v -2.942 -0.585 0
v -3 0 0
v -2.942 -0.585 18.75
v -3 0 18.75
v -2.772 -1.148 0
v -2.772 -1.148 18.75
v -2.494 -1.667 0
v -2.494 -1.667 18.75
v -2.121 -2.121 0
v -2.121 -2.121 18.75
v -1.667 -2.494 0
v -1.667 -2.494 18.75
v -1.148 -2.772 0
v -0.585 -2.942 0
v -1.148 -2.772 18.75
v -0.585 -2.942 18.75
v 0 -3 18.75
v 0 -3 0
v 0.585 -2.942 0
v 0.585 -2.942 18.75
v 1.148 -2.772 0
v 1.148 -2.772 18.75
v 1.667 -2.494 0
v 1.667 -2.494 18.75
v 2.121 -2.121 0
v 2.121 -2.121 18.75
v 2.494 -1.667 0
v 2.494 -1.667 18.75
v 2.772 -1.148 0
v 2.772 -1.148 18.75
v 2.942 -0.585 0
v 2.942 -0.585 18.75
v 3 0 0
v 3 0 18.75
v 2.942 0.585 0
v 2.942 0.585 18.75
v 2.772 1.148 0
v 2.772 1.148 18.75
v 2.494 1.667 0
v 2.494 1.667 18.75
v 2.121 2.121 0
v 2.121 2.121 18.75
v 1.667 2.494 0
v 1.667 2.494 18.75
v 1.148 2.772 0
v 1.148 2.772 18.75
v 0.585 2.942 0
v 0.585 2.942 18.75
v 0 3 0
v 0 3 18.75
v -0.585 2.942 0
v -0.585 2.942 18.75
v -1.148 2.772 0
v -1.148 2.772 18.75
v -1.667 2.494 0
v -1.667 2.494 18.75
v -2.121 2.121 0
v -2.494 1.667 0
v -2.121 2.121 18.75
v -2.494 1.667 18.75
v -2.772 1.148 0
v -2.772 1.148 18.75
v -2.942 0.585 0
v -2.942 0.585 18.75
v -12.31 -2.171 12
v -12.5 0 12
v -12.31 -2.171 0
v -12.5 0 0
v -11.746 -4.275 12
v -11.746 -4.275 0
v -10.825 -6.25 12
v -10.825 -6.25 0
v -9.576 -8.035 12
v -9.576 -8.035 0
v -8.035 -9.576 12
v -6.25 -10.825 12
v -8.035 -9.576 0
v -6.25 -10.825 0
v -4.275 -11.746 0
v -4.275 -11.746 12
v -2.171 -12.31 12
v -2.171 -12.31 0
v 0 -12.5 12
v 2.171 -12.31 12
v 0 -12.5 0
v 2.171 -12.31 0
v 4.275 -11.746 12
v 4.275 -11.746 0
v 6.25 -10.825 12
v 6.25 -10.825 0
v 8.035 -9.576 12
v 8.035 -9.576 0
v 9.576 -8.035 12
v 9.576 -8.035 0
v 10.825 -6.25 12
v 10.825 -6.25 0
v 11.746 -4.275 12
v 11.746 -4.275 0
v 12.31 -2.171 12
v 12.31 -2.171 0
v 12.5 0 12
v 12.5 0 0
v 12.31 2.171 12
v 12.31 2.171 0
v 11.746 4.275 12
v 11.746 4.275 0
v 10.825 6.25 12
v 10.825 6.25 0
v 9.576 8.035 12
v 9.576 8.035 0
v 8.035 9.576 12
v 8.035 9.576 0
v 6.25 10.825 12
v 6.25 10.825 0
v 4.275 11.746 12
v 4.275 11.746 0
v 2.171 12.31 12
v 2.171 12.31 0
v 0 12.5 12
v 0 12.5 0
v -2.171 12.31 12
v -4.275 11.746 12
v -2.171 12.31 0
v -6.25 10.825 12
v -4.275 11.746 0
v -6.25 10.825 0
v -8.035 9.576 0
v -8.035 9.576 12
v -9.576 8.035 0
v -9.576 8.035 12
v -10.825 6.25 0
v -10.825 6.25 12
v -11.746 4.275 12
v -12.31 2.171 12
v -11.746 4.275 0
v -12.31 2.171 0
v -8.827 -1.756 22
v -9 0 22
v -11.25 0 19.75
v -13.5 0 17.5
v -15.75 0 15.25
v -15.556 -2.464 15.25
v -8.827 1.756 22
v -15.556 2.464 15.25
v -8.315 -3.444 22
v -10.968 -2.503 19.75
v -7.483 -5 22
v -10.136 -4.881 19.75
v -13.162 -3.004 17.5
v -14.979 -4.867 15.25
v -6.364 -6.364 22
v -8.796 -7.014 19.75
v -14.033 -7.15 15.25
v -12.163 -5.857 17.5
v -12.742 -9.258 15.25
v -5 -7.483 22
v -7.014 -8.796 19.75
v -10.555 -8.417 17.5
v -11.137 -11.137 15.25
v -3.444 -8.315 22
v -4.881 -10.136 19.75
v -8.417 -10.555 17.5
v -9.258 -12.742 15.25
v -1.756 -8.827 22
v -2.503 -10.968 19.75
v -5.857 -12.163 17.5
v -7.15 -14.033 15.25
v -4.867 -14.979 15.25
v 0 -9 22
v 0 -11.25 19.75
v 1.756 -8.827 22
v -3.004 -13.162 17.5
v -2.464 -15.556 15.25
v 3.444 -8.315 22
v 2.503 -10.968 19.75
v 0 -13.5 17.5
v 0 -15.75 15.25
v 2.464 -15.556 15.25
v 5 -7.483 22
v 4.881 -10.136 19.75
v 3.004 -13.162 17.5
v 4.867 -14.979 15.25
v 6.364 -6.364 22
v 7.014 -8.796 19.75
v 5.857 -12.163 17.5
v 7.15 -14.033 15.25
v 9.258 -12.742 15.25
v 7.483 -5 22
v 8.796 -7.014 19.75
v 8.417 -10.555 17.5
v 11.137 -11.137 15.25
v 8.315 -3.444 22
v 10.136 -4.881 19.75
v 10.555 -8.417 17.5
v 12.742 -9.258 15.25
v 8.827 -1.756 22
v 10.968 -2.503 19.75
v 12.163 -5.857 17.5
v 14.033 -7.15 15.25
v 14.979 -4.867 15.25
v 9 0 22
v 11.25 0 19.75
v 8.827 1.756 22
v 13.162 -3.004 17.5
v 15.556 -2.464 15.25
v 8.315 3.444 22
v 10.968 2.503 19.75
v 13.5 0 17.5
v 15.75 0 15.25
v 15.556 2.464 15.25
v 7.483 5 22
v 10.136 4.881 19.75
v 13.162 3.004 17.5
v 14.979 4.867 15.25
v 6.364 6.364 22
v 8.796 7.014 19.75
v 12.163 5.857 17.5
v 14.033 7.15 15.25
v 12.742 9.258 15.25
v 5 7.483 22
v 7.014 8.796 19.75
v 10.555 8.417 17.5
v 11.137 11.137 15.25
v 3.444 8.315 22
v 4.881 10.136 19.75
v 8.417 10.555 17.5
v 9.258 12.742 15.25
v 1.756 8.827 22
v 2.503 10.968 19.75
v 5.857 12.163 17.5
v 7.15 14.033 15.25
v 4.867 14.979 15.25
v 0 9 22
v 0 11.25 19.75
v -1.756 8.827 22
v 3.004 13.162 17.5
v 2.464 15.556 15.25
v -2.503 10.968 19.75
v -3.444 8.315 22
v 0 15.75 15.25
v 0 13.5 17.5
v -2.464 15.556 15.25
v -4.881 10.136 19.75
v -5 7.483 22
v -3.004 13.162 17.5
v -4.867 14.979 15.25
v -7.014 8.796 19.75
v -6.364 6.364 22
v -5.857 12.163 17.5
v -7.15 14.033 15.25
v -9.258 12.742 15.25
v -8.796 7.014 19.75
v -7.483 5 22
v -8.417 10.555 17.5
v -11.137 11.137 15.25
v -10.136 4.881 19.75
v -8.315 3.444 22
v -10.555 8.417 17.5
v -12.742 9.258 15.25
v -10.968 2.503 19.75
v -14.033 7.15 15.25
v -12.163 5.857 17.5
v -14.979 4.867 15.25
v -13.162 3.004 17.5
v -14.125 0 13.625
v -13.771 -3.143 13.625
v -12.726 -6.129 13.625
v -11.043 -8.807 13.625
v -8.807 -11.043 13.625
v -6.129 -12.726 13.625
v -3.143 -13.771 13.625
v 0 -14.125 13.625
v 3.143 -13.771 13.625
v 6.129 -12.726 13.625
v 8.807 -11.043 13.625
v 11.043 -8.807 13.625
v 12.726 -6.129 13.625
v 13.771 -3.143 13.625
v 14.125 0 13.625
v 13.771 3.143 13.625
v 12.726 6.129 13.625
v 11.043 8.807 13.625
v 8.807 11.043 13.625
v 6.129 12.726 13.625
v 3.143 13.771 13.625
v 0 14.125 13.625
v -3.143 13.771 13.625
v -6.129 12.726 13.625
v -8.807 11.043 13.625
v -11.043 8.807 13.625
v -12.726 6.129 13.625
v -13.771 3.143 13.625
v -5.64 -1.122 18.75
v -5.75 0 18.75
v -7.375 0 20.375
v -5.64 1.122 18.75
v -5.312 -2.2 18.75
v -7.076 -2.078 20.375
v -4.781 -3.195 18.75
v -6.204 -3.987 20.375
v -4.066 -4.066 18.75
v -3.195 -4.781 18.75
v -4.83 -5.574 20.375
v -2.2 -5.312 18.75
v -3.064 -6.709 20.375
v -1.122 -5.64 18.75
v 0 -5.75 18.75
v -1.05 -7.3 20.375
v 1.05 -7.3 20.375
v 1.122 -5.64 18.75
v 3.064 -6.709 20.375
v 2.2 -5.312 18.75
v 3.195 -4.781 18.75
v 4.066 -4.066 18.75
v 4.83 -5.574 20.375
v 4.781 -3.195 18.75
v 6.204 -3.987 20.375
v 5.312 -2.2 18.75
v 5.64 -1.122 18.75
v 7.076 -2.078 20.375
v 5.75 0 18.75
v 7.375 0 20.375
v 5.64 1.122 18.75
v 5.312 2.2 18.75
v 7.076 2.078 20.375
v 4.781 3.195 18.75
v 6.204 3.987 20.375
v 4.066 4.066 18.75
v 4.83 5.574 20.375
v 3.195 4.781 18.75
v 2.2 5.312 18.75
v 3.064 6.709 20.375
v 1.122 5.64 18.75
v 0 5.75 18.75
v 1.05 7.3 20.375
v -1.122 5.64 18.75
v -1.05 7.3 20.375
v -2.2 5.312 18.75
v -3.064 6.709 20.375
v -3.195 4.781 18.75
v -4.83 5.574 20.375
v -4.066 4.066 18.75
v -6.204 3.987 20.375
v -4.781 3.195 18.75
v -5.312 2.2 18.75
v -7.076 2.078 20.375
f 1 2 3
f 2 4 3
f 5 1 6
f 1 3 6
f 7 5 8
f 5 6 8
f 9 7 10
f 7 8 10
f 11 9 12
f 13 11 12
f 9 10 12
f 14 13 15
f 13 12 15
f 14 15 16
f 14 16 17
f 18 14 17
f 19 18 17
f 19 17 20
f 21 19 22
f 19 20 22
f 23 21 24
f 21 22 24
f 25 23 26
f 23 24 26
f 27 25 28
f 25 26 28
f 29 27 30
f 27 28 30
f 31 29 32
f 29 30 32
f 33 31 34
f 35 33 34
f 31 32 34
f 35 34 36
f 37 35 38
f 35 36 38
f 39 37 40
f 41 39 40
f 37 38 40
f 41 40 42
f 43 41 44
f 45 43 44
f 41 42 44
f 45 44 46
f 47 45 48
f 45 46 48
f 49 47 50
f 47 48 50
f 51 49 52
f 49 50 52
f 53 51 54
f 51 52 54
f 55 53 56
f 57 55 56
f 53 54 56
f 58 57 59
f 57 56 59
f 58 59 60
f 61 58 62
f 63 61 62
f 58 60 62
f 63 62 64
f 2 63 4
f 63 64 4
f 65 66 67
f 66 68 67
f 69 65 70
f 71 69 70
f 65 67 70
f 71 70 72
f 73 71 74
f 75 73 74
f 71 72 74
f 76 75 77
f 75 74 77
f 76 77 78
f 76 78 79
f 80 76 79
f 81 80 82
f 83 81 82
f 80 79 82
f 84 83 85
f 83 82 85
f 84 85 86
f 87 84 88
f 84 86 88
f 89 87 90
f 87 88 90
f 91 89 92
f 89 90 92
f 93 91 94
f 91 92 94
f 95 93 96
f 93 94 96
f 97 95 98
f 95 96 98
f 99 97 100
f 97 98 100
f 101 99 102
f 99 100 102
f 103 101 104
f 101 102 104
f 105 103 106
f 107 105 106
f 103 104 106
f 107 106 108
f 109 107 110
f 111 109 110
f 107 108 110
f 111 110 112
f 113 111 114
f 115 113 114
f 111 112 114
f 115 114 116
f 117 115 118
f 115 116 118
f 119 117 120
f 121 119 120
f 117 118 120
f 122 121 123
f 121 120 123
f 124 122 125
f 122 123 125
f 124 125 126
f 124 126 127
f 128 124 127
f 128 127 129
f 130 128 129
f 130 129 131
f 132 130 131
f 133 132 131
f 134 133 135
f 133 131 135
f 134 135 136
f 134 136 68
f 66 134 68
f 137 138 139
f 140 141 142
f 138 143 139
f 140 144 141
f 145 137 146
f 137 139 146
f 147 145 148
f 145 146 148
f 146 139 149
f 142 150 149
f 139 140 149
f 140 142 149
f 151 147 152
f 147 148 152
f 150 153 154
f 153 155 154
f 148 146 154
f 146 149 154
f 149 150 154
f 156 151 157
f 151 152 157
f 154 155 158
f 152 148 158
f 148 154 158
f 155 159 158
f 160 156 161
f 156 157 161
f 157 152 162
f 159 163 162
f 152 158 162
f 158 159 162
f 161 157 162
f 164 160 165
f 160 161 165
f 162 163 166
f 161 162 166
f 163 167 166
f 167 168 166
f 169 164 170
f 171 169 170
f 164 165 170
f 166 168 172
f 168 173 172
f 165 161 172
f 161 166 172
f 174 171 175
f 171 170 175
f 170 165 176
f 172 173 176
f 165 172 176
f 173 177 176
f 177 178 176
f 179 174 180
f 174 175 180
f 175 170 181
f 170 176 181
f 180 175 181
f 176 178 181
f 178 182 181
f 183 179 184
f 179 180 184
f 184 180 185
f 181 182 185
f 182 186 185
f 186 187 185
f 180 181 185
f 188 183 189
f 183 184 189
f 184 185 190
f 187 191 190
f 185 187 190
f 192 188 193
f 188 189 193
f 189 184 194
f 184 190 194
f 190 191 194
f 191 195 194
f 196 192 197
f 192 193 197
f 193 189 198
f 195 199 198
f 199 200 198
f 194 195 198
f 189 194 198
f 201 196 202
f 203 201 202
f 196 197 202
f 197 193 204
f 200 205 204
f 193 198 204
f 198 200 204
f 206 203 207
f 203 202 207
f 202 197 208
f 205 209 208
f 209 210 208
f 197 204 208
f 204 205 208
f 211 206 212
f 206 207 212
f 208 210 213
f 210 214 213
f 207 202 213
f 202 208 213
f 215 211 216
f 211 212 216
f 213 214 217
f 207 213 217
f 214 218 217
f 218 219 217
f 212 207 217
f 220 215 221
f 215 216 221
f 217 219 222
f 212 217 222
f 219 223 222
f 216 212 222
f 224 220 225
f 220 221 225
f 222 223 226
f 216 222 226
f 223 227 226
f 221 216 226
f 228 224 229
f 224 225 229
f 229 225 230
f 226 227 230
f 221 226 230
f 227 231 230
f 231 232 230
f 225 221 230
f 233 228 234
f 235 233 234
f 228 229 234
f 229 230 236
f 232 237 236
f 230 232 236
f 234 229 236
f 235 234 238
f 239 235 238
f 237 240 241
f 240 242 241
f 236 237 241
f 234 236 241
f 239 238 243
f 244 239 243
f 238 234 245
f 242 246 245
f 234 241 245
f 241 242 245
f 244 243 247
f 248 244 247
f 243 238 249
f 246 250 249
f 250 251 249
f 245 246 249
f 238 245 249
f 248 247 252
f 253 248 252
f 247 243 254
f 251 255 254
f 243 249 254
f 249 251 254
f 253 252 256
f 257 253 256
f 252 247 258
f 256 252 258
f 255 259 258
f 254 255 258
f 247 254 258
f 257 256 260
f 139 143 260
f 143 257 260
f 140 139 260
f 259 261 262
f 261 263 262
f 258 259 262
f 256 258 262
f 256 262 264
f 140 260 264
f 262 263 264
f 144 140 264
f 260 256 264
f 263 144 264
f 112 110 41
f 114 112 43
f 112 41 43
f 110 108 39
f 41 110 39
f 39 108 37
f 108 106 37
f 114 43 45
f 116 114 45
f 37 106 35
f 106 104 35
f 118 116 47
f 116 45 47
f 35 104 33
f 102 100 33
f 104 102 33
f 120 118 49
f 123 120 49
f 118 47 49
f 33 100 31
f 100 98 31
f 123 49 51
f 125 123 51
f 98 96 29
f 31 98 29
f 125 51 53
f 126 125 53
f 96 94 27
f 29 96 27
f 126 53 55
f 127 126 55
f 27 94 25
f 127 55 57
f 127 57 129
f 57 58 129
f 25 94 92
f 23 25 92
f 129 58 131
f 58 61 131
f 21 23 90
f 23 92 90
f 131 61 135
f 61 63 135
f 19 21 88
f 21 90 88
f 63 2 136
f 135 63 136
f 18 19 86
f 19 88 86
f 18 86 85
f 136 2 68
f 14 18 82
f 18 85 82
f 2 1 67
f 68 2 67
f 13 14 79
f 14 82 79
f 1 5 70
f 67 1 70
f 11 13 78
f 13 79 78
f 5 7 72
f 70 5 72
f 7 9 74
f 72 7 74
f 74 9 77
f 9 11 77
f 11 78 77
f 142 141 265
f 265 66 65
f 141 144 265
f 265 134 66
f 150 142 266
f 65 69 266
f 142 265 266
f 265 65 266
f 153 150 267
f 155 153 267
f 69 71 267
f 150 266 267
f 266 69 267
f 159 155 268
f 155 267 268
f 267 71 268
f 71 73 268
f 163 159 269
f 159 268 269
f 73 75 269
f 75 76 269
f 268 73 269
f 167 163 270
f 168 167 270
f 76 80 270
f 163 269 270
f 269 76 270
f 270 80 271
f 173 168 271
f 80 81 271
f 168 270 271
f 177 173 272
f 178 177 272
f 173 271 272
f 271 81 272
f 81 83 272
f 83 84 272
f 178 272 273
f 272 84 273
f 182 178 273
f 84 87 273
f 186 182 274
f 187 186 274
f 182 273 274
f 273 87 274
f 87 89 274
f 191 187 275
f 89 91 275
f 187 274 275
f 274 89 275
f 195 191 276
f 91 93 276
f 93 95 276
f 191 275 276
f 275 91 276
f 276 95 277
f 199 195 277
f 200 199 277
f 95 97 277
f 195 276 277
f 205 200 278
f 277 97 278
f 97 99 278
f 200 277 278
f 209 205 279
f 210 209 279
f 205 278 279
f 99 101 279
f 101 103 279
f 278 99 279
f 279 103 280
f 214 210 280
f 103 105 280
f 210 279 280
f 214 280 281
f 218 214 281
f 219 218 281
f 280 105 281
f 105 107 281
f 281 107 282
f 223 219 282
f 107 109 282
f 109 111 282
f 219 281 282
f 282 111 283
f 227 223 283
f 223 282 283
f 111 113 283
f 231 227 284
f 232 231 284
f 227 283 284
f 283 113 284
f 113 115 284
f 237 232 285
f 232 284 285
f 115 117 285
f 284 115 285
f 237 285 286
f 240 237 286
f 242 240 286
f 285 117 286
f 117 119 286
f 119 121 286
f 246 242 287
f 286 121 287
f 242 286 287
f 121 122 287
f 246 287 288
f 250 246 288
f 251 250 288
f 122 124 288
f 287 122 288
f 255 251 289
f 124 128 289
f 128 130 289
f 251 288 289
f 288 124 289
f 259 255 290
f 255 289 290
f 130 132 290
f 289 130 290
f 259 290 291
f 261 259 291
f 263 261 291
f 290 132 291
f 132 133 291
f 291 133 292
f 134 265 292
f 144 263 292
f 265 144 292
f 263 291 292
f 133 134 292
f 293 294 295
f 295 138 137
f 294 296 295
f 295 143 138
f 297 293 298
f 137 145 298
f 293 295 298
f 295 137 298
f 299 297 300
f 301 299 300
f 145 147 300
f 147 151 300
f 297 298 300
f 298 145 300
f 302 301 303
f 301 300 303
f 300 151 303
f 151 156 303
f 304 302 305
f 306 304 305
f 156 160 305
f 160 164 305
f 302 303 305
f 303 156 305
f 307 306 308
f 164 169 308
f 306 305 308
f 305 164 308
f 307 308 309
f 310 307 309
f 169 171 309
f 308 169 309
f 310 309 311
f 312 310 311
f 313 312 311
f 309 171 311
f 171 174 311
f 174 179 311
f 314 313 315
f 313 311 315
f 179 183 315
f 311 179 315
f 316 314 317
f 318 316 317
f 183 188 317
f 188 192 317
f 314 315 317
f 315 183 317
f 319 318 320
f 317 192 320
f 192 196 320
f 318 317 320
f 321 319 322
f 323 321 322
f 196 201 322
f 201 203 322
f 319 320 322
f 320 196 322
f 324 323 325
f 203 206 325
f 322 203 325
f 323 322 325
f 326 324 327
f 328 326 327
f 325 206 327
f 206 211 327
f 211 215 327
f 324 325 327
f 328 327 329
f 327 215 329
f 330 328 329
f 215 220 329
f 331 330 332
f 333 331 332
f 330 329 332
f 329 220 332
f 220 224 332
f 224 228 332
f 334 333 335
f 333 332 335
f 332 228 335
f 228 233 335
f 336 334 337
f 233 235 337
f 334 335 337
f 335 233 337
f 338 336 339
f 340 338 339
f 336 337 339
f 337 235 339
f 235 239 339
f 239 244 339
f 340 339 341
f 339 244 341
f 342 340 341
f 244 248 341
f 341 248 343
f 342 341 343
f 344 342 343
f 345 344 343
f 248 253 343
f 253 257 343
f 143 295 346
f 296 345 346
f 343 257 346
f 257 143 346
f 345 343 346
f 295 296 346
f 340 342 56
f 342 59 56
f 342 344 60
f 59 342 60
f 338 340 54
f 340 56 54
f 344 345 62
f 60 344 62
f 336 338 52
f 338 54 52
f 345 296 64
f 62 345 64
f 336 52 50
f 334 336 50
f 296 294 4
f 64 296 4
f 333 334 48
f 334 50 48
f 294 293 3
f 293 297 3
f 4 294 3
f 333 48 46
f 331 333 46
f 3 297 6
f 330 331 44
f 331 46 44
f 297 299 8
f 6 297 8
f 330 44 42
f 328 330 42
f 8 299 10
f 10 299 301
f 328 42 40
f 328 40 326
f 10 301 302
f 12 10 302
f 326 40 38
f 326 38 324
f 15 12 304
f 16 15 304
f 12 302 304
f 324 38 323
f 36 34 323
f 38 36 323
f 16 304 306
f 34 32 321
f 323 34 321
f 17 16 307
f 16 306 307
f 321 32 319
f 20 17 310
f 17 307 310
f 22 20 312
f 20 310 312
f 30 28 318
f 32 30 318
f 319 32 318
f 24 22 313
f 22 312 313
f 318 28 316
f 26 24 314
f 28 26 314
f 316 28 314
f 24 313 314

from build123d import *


with BuildPart() as part:
    # Sketch → Revolution (revolve)
    with BuildSketch(Plane.XZ):
        Polygon((-3, 18.75), (-5.75, 18.75), (-9, 22), (-15.75, 15.25), (-12.5, 12), (-12.5, 0), (-3, 0), align=None)
    revolve(axis=Axis((0, 0, 0), (0, 0, 1)))


solid = part.part
